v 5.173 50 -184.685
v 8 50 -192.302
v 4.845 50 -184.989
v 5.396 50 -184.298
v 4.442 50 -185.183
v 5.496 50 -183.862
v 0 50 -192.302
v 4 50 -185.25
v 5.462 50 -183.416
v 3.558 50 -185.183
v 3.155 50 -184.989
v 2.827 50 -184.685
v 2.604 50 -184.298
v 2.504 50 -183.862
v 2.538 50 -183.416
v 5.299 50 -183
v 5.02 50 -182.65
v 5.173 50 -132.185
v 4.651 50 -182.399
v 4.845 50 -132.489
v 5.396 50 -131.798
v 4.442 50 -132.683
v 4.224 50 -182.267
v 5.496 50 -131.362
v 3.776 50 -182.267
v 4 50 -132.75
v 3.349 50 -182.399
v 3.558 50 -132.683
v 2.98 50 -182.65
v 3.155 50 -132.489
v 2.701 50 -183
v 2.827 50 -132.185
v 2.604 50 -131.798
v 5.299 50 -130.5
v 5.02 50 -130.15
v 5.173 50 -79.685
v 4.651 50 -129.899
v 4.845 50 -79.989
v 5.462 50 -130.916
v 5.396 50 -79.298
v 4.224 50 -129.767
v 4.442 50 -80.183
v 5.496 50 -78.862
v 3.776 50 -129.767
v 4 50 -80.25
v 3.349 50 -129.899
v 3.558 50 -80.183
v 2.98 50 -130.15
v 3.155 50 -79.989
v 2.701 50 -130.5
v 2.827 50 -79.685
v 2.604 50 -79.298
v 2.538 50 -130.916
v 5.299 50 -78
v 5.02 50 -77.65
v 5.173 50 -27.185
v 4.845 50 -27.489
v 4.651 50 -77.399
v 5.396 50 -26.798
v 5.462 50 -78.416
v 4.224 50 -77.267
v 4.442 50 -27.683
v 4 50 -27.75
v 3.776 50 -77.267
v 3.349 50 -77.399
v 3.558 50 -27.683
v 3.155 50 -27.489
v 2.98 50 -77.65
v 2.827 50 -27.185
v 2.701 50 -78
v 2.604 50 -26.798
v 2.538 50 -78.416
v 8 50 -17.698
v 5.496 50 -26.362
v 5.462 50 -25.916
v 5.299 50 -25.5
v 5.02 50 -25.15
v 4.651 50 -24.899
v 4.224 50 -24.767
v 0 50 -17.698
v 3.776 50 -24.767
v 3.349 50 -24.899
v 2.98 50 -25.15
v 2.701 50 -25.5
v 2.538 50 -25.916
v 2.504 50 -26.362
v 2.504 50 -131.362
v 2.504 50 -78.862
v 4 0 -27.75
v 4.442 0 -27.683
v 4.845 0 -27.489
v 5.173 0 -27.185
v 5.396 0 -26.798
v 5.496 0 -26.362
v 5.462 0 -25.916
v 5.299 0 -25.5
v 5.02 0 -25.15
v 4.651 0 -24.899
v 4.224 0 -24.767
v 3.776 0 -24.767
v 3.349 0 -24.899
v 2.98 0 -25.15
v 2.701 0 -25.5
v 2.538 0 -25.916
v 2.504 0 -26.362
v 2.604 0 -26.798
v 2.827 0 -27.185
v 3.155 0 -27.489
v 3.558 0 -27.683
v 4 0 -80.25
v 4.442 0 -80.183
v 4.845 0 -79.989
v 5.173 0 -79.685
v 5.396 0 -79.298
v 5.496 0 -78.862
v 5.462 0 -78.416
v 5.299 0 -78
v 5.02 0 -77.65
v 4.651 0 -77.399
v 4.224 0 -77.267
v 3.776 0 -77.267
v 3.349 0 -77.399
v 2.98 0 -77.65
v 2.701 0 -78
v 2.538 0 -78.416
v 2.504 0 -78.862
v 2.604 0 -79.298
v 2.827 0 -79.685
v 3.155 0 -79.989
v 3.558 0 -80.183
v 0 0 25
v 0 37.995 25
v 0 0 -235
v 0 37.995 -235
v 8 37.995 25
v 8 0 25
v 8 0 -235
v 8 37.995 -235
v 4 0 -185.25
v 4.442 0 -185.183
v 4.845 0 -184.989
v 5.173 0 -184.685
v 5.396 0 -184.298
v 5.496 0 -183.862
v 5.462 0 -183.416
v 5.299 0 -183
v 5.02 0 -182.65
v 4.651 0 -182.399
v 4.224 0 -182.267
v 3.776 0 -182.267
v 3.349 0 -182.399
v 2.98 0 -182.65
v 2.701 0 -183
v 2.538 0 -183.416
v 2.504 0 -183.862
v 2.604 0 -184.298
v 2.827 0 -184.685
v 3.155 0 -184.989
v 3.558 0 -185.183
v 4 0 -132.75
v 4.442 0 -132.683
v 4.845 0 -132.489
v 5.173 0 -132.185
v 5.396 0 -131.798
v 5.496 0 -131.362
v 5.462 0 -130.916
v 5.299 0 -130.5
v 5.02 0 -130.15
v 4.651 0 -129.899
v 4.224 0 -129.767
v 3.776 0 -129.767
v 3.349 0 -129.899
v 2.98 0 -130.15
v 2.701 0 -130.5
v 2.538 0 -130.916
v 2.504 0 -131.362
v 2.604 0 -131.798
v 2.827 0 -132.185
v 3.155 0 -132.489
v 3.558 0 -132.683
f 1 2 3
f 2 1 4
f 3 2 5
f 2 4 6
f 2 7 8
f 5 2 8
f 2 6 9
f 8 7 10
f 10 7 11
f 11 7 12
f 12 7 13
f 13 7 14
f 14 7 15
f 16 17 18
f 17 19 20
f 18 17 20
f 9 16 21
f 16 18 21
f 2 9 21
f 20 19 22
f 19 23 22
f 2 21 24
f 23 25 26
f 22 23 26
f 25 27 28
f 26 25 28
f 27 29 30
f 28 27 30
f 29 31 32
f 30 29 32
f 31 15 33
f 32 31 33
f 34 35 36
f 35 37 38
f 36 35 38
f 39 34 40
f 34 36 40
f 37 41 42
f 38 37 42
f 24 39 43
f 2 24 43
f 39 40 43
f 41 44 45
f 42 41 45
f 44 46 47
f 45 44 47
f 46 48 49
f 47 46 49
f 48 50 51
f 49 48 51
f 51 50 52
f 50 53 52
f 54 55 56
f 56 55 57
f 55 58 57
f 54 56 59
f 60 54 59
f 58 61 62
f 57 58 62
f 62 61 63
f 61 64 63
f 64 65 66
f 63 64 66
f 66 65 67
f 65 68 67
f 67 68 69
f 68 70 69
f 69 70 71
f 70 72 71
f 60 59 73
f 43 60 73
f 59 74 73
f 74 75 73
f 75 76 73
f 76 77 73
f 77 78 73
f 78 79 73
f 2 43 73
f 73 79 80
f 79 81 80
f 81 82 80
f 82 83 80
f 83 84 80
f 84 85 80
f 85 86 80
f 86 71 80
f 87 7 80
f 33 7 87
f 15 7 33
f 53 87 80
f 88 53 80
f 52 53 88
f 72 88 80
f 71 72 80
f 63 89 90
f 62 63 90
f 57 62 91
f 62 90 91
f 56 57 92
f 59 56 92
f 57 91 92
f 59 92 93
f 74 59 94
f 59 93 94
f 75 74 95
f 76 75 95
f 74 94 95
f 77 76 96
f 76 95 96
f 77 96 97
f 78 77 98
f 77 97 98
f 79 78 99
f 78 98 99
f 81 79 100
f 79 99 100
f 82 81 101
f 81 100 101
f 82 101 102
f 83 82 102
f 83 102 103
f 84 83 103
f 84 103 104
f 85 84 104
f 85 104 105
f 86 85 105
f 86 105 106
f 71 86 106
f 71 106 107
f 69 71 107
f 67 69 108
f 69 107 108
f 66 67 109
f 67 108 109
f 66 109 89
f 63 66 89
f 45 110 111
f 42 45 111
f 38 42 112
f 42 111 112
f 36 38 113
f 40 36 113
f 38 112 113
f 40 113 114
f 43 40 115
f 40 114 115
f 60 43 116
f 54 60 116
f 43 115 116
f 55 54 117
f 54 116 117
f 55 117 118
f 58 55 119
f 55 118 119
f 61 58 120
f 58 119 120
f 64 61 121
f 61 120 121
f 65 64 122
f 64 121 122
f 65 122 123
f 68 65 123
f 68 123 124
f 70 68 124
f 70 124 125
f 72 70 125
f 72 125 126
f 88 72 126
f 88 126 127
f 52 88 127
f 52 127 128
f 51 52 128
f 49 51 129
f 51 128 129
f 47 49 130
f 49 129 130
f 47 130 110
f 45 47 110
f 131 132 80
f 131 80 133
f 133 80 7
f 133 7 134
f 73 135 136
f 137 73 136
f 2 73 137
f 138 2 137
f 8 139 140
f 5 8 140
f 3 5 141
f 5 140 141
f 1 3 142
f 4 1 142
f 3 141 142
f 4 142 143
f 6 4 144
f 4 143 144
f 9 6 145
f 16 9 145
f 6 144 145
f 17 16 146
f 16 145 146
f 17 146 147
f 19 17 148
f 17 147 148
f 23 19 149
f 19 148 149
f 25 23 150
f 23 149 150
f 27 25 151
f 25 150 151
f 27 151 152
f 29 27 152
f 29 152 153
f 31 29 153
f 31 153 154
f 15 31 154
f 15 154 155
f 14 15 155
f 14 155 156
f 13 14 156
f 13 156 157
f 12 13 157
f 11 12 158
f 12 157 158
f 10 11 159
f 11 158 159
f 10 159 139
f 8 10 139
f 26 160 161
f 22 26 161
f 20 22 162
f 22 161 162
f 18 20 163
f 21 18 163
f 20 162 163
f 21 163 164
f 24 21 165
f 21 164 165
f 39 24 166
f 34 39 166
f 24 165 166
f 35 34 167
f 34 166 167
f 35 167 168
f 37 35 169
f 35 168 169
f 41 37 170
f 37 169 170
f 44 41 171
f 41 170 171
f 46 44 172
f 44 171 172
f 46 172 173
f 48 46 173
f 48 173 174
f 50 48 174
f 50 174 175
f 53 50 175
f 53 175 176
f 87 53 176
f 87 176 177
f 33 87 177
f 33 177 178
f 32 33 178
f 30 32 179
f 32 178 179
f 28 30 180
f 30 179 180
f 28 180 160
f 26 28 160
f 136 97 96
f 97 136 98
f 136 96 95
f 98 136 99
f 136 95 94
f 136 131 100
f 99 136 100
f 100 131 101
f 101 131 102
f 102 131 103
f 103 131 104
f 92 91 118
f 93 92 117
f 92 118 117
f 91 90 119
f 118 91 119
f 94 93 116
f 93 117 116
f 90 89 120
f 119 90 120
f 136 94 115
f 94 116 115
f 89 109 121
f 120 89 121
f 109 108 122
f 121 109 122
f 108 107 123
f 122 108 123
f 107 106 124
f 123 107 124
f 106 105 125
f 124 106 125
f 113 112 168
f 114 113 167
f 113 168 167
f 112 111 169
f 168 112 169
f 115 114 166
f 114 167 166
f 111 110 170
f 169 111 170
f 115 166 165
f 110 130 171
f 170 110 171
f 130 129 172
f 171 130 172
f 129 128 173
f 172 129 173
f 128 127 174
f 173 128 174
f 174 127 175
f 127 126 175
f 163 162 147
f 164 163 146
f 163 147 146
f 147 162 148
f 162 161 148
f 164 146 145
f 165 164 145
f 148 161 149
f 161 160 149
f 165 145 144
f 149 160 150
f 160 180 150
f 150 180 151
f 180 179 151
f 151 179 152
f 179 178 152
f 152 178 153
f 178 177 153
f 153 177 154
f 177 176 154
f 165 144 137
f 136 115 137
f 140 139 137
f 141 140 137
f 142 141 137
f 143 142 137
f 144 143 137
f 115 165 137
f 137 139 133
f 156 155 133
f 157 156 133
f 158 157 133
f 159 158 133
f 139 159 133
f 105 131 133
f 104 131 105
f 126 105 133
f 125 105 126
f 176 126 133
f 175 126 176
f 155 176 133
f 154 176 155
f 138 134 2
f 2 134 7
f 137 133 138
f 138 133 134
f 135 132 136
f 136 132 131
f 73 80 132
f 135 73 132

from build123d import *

# Parameters (mm, degrees)
BOSS_EXTRUDE1_DEPTH = 8
SKETCH6_R           = 1.5
CUT_EXTRUDE2_DEPTH  = 50


with BuildPart() as part:
    # Sketch1 → Boss-Extrude1 (new body)
    with BuildSketch(Plane(origin=(0, 0, 0), x_dir=(0, 0, -1), z_dir=(1, 0, 0))):
        Polygon((-25, 0), (235, 0), (235, 37.995251441), (192.301615505, 50), (17.698384495, 50), (-25, 37.995251441), align=None)
    extrude(amount=BOSS_EXTRUDE1_DEPTH)

    # Sketch6 → Cut-Extrude2 (cut)
    with BuildSketch(Plane.XZ):
        with Locations(Location((4, -26.25, 0), (0, 0, 270))):
            Circle(SKETCH6_R)
        with Locations(Location((4, -78.75, 0), (0, 0, 270))):
            Circle(SKETCH6_R)
        with Locations(Location((4, -131.25, 0), (0, 0, 270))):
            Circle(SKETCH6_R)
        with Locations(Location((4, -183.75, 0), (0, 0, 270))):
            Circle(SKETCH6_R)
    extrude(amount=-CUT_EXTRUDE2_DEPTH, mode=Mode.SUBTRACT)


solid = part.part
